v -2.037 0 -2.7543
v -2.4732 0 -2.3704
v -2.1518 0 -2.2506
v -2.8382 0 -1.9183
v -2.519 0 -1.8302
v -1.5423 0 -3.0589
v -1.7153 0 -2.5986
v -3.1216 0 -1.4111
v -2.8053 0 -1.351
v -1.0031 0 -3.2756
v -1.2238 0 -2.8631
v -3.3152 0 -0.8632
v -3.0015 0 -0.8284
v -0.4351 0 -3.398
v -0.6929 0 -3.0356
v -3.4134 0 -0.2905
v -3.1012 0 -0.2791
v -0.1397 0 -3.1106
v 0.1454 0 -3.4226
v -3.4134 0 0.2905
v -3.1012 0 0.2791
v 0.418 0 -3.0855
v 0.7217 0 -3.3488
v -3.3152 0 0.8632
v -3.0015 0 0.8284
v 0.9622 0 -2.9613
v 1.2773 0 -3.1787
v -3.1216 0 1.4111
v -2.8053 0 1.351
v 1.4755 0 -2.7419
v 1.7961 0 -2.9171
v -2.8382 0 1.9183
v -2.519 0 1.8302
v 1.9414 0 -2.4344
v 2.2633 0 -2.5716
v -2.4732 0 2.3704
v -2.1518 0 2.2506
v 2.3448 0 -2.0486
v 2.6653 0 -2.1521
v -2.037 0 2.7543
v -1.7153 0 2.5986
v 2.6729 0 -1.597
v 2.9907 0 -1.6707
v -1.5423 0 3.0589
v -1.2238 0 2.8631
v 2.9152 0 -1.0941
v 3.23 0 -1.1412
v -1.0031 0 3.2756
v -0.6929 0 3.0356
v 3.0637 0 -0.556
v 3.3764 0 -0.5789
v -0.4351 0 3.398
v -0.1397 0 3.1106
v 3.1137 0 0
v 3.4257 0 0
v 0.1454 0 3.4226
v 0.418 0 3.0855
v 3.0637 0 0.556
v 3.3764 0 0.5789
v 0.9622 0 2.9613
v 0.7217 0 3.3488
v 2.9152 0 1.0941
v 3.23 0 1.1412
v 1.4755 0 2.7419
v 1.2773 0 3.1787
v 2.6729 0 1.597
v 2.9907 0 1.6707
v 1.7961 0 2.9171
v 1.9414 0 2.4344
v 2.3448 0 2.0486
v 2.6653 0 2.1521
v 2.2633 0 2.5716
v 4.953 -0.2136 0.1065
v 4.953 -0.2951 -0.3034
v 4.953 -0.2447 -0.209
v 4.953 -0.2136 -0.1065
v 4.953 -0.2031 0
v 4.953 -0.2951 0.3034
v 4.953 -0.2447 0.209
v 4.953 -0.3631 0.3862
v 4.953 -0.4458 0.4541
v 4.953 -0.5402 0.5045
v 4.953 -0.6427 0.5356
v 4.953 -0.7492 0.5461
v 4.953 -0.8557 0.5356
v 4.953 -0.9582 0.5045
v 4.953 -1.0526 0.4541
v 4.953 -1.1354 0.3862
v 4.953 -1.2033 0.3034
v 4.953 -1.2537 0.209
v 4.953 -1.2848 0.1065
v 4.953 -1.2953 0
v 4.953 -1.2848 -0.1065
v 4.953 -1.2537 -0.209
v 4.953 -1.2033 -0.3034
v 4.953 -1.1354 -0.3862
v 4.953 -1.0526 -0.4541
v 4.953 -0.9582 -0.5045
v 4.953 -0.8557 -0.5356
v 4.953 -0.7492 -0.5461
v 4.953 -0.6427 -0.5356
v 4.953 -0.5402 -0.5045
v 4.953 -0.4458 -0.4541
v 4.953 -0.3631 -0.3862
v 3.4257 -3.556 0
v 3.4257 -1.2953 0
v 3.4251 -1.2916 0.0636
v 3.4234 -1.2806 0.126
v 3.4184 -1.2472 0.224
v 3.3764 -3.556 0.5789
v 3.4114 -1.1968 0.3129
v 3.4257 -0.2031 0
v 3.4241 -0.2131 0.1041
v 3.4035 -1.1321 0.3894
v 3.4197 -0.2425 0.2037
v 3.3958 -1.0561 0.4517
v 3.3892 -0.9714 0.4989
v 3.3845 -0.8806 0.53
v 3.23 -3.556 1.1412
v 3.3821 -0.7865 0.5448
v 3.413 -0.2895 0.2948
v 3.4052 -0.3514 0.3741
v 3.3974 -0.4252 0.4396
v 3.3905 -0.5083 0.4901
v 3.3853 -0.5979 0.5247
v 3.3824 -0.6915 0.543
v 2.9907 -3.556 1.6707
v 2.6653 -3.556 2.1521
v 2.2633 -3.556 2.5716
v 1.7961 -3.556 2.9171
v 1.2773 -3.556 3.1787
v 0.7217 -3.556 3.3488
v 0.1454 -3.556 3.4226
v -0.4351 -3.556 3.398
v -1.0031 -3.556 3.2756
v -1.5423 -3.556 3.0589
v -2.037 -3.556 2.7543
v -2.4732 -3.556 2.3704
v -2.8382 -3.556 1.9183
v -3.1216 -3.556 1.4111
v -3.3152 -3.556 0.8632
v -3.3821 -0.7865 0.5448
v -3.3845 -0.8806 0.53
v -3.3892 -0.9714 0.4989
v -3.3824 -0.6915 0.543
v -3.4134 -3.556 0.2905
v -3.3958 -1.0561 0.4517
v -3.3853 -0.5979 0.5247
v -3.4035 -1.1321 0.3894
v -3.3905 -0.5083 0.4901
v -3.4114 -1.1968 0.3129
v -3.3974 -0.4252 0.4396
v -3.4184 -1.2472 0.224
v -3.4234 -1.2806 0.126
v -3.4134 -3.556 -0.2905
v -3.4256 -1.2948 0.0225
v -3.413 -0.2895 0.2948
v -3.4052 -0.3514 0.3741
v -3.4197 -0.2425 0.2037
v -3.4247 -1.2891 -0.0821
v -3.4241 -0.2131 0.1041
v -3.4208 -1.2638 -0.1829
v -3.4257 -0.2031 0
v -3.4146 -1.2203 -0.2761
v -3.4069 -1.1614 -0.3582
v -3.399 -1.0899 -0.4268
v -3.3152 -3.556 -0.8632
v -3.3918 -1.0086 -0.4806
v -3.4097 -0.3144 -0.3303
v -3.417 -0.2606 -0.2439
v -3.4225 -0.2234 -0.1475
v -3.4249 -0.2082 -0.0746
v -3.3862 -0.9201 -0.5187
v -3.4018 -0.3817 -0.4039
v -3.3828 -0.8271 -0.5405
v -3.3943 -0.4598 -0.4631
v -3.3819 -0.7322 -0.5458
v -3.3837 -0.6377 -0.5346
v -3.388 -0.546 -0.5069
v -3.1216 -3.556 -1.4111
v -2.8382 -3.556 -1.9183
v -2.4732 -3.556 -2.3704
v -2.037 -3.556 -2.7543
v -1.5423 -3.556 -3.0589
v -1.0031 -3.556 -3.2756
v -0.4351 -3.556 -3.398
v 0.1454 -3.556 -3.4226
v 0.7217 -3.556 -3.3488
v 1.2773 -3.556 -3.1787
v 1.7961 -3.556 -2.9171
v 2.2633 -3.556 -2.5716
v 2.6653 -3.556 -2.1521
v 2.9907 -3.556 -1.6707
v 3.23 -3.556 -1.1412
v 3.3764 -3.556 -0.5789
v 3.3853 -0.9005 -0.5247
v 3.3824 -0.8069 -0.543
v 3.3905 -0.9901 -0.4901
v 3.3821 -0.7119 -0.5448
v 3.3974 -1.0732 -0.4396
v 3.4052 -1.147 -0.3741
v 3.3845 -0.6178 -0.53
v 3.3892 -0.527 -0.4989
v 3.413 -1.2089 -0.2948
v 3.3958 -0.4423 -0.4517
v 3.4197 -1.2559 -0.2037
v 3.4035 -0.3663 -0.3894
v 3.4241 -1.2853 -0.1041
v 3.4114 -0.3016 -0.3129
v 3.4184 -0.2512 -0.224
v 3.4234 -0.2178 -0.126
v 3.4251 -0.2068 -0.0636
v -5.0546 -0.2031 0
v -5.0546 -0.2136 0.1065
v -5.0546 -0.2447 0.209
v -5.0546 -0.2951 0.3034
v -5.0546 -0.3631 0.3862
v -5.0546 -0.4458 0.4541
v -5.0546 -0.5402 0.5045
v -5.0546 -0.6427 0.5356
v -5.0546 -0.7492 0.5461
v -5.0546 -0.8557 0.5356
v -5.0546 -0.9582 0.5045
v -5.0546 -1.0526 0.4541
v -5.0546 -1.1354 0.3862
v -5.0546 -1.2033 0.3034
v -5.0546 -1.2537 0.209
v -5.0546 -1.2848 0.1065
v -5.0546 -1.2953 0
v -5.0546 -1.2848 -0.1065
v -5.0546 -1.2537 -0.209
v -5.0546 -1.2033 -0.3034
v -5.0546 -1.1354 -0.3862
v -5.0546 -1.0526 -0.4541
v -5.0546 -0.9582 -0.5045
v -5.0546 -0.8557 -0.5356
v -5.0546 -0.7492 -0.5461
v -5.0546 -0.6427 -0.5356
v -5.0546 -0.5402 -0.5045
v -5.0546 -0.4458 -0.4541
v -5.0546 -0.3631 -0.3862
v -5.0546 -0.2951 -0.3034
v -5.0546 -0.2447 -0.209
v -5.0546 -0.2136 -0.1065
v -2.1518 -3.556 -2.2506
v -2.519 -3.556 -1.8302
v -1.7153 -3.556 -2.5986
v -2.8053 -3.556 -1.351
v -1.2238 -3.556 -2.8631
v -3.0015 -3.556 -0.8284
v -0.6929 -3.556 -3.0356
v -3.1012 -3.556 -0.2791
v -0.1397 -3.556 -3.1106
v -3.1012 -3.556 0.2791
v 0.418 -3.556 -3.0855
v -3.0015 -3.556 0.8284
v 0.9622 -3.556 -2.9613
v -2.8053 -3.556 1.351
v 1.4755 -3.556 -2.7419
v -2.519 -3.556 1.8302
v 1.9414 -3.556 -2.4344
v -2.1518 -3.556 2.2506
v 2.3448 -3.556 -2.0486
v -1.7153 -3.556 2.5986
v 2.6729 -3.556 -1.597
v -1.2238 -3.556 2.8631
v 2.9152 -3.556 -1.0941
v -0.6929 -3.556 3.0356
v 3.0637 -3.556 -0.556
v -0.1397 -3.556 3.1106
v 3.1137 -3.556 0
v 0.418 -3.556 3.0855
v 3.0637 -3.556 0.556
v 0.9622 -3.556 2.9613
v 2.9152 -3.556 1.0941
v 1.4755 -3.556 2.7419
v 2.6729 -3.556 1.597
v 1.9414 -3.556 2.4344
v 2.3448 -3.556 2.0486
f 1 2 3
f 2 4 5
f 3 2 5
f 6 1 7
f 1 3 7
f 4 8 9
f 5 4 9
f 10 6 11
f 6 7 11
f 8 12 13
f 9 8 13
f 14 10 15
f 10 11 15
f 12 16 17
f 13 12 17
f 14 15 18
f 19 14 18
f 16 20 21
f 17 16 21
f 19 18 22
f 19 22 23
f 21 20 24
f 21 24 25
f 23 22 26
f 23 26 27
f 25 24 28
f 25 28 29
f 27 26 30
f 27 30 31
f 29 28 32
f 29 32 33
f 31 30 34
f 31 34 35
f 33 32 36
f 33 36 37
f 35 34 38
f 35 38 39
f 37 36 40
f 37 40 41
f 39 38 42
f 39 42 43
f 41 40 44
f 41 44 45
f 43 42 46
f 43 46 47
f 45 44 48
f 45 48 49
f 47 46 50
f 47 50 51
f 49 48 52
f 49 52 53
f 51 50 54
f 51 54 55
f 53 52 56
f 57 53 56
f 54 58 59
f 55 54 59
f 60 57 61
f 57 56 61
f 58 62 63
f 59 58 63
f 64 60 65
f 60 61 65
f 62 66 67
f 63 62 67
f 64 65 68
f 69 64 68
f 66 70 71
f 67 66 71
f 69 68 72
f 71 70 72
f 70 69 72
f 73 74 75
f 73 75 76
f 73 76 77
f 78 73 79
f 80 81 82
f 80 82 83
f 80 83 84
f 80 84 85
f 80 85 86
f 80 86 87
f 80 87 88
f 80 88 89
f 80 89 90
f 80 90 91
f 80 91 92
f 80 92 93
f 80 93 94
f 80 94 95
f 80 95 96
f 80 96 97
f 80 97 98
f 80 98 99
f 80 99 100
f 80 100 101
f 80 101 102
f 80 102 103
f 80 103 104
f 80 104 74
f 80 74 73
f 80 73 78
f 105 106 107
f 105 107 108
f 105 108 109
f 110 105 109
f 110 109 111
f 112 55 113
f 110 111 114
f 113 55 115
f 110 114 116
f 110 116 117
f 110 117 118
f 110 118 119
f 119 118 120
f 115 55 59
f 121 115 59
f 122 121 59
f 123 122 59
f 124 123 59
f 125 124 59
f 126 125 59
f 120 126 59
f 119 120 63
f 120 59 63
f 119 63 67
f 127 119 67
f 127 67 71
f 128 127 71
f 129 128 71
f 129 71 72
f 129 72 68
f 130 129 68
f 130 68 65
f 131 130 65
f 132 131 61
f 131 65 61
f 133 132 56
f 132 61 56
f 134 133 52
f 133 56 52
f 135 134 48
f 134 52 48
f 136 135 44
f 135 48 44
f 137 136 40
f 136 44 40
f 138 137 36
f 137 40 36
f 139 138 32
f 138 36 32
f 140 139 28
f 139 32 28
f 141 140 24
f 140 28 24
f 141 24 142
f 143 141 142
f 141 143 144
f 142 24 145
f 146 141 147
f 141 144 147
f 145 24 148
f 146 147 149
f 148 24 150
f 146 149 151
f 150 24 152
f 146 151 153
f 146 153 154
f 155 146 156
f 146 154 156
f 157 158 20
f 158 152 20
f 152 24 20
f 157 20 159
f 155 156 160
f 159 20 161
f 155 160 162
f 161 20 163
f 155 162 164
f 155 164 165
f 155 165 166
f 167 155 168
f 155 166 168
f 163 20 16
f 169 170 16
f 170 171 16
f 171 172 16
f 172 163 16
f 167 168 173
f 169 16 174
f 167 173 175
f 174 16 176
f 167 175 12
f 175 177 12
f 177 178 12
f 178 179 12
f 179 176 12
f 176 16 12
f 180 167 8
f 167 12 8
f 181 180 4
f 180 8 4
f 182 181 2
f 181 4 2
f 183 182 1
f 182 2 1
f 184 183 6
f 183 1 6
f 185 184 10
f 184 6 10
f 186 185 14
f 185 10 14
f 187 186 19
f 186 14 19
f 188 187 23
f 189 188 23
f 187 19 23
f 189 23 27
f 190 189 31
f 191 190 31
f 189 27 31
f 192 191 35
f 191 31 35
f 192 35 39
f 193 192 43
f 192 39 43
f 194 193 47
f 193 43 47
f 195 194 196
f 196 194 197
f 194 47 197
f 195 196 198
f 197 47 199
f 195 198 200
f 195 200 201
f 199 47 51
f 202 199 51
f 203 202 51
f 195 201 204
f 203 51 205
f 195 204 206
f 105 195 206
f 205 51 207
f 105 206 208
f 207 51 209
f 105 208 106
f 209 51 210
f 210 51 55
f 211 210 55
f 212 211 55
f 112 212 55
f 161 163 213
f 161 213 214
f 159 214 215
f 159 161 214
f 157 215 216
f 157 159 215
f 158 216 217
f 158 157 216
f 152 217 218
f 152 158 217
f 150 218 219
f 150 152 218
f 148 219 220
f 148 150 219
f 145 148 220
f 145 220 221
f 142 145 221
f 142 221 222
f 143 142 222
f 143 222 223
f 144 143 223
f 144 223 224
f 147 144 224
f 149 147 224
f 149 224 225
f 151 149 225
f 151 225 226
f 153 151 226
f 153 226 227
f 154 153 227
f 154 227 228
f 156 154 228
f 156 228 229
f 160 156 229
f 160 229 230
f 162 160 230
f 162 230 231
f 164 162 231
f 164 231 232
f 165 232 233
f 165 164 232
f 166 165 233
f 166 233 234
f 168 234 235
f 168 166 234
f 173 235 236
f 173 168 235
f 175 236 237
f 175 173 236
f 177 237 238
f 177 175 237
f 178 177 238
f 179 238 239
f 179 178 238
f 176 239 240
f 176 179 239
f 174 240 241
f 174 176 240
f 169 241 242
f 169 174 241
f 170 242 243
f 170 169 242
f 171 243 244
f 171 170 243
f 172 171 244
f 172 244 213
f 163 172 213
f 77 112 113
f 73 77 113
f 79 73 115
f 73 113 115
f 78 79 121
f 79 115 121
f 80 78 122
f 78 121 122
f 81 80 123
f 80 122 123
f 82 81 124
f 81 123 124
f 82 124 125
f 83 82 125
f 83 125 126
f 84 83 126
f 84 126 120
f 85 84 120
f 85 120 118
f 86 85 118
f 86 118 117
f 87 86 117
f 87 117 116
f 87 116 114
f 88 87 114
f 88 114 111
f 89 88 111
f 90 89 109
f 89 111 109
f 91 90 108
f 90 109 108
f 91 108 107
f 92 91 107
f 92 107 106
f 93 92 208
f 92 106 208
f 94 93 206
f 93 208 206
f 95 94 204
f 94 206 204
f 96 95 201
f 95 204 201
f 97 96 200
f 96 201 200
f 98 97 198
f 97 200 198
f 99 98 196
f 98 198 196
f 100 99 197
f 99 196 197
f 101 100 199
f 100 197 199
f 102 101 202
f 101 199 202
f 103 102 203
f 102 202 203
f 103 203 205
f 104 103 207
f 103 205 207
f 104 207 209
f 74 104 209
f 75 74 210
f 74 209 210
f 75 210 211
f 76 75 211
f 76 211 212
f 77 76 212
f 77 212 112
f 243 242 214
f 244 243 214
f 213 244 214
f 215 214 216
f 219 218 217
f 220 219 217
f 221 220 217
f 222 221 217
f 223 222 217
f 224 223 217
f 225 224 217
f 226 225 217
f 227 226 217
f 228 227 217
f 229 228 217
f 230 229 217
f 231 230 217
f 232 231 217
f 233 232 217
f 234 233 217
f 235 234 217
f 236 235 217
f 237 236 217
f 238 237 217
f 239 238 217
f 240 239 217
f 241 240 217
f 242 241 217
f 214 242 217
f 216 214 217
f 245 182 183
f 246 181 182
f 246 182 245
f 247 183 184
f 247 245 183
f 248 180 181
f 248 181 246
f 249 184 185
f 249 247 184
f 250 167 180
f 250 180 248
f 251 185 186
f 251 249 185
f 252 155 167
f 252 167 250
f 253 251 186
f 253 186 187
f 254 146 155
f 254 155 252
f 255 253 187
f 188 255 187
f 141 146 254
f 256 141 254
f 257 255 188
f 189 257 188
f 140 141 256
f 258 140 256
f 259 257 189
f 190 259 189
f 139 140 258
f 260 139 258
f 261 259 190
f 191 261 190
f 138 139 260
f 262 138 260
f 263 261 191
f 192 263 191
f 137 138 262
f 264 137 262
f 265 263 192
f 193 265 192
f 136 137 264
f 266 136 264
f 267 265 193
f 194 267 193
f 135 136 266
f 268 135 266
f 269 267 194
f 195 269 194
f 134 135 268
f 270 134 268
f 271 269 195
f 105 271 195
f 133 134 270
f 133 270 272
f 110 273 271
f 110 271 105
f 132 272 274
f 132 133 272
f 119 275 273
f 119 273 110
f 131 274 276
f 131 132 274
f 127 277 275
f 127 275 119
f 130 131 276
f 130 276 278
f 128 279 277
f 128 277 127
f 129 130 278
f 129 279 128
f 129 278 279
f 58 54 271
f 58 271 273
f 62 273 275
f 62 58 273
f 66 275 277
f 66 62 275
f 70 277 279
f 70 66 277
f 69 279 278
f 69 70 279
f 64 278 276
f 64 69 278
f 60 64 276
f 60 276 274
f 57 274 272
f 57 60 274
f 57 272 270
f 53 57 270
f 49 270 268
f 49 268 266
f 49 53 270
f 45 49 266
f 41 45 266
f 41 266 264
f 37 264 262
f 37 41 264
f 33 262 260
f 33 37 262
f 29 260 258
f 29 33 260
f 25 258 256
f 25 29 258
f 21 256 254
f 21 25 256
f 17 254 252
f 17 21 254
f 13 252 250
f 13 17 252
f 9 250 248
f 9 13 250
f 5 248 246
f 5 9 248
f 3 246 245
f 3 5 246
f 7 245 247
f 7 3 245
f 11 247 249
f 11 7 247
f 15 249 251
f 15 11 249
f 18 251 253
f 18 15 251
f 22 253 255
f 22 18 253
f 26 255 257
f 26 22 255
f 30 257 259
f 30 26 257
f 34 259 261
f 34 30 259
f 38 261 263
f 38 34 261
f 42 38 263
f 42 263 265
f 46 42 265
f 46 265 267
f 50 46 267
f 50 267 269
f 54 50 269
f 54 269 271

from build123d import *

# Parameters (mm, degrees)
F0_R     = 3.4257116129
F0_R_2   = 3.1136968268
F1_DEPTH = 3.556
F3_START = 3.2004
F2_R     = 0.5461
F3_DEPTH = 1.7526
F4_START = -3.175
F4_DEPTH = 1.8796


with BuildPart() as f1:
    # F0 (on Front) → F1 (new body)
    with BuildSketch(Plane.XZ):
        Circle(F0_R)
        Circle(F0_R_2, mode=Mode.SUBTRACT)
    extrude(amount=F1_DEPTH)

    # F2 (on Right) → F3 (join)
    with BuildSketch(Plane.YZ.offset(F3_START)):
        with Locations((-0.7492110241, 0)):
            Circle(F2_R)
    extrude(amount=F3_DEPTH)

    # F2 (on Right) → F4 (join)
    with BuildSketch(Plane.YZ.offset(F4_START)):
        with Locations((-0.7492110241, 0)):
            Circle(F2_R)
    extrude(amount=-F4_DEPTH)


solid = f1.part
